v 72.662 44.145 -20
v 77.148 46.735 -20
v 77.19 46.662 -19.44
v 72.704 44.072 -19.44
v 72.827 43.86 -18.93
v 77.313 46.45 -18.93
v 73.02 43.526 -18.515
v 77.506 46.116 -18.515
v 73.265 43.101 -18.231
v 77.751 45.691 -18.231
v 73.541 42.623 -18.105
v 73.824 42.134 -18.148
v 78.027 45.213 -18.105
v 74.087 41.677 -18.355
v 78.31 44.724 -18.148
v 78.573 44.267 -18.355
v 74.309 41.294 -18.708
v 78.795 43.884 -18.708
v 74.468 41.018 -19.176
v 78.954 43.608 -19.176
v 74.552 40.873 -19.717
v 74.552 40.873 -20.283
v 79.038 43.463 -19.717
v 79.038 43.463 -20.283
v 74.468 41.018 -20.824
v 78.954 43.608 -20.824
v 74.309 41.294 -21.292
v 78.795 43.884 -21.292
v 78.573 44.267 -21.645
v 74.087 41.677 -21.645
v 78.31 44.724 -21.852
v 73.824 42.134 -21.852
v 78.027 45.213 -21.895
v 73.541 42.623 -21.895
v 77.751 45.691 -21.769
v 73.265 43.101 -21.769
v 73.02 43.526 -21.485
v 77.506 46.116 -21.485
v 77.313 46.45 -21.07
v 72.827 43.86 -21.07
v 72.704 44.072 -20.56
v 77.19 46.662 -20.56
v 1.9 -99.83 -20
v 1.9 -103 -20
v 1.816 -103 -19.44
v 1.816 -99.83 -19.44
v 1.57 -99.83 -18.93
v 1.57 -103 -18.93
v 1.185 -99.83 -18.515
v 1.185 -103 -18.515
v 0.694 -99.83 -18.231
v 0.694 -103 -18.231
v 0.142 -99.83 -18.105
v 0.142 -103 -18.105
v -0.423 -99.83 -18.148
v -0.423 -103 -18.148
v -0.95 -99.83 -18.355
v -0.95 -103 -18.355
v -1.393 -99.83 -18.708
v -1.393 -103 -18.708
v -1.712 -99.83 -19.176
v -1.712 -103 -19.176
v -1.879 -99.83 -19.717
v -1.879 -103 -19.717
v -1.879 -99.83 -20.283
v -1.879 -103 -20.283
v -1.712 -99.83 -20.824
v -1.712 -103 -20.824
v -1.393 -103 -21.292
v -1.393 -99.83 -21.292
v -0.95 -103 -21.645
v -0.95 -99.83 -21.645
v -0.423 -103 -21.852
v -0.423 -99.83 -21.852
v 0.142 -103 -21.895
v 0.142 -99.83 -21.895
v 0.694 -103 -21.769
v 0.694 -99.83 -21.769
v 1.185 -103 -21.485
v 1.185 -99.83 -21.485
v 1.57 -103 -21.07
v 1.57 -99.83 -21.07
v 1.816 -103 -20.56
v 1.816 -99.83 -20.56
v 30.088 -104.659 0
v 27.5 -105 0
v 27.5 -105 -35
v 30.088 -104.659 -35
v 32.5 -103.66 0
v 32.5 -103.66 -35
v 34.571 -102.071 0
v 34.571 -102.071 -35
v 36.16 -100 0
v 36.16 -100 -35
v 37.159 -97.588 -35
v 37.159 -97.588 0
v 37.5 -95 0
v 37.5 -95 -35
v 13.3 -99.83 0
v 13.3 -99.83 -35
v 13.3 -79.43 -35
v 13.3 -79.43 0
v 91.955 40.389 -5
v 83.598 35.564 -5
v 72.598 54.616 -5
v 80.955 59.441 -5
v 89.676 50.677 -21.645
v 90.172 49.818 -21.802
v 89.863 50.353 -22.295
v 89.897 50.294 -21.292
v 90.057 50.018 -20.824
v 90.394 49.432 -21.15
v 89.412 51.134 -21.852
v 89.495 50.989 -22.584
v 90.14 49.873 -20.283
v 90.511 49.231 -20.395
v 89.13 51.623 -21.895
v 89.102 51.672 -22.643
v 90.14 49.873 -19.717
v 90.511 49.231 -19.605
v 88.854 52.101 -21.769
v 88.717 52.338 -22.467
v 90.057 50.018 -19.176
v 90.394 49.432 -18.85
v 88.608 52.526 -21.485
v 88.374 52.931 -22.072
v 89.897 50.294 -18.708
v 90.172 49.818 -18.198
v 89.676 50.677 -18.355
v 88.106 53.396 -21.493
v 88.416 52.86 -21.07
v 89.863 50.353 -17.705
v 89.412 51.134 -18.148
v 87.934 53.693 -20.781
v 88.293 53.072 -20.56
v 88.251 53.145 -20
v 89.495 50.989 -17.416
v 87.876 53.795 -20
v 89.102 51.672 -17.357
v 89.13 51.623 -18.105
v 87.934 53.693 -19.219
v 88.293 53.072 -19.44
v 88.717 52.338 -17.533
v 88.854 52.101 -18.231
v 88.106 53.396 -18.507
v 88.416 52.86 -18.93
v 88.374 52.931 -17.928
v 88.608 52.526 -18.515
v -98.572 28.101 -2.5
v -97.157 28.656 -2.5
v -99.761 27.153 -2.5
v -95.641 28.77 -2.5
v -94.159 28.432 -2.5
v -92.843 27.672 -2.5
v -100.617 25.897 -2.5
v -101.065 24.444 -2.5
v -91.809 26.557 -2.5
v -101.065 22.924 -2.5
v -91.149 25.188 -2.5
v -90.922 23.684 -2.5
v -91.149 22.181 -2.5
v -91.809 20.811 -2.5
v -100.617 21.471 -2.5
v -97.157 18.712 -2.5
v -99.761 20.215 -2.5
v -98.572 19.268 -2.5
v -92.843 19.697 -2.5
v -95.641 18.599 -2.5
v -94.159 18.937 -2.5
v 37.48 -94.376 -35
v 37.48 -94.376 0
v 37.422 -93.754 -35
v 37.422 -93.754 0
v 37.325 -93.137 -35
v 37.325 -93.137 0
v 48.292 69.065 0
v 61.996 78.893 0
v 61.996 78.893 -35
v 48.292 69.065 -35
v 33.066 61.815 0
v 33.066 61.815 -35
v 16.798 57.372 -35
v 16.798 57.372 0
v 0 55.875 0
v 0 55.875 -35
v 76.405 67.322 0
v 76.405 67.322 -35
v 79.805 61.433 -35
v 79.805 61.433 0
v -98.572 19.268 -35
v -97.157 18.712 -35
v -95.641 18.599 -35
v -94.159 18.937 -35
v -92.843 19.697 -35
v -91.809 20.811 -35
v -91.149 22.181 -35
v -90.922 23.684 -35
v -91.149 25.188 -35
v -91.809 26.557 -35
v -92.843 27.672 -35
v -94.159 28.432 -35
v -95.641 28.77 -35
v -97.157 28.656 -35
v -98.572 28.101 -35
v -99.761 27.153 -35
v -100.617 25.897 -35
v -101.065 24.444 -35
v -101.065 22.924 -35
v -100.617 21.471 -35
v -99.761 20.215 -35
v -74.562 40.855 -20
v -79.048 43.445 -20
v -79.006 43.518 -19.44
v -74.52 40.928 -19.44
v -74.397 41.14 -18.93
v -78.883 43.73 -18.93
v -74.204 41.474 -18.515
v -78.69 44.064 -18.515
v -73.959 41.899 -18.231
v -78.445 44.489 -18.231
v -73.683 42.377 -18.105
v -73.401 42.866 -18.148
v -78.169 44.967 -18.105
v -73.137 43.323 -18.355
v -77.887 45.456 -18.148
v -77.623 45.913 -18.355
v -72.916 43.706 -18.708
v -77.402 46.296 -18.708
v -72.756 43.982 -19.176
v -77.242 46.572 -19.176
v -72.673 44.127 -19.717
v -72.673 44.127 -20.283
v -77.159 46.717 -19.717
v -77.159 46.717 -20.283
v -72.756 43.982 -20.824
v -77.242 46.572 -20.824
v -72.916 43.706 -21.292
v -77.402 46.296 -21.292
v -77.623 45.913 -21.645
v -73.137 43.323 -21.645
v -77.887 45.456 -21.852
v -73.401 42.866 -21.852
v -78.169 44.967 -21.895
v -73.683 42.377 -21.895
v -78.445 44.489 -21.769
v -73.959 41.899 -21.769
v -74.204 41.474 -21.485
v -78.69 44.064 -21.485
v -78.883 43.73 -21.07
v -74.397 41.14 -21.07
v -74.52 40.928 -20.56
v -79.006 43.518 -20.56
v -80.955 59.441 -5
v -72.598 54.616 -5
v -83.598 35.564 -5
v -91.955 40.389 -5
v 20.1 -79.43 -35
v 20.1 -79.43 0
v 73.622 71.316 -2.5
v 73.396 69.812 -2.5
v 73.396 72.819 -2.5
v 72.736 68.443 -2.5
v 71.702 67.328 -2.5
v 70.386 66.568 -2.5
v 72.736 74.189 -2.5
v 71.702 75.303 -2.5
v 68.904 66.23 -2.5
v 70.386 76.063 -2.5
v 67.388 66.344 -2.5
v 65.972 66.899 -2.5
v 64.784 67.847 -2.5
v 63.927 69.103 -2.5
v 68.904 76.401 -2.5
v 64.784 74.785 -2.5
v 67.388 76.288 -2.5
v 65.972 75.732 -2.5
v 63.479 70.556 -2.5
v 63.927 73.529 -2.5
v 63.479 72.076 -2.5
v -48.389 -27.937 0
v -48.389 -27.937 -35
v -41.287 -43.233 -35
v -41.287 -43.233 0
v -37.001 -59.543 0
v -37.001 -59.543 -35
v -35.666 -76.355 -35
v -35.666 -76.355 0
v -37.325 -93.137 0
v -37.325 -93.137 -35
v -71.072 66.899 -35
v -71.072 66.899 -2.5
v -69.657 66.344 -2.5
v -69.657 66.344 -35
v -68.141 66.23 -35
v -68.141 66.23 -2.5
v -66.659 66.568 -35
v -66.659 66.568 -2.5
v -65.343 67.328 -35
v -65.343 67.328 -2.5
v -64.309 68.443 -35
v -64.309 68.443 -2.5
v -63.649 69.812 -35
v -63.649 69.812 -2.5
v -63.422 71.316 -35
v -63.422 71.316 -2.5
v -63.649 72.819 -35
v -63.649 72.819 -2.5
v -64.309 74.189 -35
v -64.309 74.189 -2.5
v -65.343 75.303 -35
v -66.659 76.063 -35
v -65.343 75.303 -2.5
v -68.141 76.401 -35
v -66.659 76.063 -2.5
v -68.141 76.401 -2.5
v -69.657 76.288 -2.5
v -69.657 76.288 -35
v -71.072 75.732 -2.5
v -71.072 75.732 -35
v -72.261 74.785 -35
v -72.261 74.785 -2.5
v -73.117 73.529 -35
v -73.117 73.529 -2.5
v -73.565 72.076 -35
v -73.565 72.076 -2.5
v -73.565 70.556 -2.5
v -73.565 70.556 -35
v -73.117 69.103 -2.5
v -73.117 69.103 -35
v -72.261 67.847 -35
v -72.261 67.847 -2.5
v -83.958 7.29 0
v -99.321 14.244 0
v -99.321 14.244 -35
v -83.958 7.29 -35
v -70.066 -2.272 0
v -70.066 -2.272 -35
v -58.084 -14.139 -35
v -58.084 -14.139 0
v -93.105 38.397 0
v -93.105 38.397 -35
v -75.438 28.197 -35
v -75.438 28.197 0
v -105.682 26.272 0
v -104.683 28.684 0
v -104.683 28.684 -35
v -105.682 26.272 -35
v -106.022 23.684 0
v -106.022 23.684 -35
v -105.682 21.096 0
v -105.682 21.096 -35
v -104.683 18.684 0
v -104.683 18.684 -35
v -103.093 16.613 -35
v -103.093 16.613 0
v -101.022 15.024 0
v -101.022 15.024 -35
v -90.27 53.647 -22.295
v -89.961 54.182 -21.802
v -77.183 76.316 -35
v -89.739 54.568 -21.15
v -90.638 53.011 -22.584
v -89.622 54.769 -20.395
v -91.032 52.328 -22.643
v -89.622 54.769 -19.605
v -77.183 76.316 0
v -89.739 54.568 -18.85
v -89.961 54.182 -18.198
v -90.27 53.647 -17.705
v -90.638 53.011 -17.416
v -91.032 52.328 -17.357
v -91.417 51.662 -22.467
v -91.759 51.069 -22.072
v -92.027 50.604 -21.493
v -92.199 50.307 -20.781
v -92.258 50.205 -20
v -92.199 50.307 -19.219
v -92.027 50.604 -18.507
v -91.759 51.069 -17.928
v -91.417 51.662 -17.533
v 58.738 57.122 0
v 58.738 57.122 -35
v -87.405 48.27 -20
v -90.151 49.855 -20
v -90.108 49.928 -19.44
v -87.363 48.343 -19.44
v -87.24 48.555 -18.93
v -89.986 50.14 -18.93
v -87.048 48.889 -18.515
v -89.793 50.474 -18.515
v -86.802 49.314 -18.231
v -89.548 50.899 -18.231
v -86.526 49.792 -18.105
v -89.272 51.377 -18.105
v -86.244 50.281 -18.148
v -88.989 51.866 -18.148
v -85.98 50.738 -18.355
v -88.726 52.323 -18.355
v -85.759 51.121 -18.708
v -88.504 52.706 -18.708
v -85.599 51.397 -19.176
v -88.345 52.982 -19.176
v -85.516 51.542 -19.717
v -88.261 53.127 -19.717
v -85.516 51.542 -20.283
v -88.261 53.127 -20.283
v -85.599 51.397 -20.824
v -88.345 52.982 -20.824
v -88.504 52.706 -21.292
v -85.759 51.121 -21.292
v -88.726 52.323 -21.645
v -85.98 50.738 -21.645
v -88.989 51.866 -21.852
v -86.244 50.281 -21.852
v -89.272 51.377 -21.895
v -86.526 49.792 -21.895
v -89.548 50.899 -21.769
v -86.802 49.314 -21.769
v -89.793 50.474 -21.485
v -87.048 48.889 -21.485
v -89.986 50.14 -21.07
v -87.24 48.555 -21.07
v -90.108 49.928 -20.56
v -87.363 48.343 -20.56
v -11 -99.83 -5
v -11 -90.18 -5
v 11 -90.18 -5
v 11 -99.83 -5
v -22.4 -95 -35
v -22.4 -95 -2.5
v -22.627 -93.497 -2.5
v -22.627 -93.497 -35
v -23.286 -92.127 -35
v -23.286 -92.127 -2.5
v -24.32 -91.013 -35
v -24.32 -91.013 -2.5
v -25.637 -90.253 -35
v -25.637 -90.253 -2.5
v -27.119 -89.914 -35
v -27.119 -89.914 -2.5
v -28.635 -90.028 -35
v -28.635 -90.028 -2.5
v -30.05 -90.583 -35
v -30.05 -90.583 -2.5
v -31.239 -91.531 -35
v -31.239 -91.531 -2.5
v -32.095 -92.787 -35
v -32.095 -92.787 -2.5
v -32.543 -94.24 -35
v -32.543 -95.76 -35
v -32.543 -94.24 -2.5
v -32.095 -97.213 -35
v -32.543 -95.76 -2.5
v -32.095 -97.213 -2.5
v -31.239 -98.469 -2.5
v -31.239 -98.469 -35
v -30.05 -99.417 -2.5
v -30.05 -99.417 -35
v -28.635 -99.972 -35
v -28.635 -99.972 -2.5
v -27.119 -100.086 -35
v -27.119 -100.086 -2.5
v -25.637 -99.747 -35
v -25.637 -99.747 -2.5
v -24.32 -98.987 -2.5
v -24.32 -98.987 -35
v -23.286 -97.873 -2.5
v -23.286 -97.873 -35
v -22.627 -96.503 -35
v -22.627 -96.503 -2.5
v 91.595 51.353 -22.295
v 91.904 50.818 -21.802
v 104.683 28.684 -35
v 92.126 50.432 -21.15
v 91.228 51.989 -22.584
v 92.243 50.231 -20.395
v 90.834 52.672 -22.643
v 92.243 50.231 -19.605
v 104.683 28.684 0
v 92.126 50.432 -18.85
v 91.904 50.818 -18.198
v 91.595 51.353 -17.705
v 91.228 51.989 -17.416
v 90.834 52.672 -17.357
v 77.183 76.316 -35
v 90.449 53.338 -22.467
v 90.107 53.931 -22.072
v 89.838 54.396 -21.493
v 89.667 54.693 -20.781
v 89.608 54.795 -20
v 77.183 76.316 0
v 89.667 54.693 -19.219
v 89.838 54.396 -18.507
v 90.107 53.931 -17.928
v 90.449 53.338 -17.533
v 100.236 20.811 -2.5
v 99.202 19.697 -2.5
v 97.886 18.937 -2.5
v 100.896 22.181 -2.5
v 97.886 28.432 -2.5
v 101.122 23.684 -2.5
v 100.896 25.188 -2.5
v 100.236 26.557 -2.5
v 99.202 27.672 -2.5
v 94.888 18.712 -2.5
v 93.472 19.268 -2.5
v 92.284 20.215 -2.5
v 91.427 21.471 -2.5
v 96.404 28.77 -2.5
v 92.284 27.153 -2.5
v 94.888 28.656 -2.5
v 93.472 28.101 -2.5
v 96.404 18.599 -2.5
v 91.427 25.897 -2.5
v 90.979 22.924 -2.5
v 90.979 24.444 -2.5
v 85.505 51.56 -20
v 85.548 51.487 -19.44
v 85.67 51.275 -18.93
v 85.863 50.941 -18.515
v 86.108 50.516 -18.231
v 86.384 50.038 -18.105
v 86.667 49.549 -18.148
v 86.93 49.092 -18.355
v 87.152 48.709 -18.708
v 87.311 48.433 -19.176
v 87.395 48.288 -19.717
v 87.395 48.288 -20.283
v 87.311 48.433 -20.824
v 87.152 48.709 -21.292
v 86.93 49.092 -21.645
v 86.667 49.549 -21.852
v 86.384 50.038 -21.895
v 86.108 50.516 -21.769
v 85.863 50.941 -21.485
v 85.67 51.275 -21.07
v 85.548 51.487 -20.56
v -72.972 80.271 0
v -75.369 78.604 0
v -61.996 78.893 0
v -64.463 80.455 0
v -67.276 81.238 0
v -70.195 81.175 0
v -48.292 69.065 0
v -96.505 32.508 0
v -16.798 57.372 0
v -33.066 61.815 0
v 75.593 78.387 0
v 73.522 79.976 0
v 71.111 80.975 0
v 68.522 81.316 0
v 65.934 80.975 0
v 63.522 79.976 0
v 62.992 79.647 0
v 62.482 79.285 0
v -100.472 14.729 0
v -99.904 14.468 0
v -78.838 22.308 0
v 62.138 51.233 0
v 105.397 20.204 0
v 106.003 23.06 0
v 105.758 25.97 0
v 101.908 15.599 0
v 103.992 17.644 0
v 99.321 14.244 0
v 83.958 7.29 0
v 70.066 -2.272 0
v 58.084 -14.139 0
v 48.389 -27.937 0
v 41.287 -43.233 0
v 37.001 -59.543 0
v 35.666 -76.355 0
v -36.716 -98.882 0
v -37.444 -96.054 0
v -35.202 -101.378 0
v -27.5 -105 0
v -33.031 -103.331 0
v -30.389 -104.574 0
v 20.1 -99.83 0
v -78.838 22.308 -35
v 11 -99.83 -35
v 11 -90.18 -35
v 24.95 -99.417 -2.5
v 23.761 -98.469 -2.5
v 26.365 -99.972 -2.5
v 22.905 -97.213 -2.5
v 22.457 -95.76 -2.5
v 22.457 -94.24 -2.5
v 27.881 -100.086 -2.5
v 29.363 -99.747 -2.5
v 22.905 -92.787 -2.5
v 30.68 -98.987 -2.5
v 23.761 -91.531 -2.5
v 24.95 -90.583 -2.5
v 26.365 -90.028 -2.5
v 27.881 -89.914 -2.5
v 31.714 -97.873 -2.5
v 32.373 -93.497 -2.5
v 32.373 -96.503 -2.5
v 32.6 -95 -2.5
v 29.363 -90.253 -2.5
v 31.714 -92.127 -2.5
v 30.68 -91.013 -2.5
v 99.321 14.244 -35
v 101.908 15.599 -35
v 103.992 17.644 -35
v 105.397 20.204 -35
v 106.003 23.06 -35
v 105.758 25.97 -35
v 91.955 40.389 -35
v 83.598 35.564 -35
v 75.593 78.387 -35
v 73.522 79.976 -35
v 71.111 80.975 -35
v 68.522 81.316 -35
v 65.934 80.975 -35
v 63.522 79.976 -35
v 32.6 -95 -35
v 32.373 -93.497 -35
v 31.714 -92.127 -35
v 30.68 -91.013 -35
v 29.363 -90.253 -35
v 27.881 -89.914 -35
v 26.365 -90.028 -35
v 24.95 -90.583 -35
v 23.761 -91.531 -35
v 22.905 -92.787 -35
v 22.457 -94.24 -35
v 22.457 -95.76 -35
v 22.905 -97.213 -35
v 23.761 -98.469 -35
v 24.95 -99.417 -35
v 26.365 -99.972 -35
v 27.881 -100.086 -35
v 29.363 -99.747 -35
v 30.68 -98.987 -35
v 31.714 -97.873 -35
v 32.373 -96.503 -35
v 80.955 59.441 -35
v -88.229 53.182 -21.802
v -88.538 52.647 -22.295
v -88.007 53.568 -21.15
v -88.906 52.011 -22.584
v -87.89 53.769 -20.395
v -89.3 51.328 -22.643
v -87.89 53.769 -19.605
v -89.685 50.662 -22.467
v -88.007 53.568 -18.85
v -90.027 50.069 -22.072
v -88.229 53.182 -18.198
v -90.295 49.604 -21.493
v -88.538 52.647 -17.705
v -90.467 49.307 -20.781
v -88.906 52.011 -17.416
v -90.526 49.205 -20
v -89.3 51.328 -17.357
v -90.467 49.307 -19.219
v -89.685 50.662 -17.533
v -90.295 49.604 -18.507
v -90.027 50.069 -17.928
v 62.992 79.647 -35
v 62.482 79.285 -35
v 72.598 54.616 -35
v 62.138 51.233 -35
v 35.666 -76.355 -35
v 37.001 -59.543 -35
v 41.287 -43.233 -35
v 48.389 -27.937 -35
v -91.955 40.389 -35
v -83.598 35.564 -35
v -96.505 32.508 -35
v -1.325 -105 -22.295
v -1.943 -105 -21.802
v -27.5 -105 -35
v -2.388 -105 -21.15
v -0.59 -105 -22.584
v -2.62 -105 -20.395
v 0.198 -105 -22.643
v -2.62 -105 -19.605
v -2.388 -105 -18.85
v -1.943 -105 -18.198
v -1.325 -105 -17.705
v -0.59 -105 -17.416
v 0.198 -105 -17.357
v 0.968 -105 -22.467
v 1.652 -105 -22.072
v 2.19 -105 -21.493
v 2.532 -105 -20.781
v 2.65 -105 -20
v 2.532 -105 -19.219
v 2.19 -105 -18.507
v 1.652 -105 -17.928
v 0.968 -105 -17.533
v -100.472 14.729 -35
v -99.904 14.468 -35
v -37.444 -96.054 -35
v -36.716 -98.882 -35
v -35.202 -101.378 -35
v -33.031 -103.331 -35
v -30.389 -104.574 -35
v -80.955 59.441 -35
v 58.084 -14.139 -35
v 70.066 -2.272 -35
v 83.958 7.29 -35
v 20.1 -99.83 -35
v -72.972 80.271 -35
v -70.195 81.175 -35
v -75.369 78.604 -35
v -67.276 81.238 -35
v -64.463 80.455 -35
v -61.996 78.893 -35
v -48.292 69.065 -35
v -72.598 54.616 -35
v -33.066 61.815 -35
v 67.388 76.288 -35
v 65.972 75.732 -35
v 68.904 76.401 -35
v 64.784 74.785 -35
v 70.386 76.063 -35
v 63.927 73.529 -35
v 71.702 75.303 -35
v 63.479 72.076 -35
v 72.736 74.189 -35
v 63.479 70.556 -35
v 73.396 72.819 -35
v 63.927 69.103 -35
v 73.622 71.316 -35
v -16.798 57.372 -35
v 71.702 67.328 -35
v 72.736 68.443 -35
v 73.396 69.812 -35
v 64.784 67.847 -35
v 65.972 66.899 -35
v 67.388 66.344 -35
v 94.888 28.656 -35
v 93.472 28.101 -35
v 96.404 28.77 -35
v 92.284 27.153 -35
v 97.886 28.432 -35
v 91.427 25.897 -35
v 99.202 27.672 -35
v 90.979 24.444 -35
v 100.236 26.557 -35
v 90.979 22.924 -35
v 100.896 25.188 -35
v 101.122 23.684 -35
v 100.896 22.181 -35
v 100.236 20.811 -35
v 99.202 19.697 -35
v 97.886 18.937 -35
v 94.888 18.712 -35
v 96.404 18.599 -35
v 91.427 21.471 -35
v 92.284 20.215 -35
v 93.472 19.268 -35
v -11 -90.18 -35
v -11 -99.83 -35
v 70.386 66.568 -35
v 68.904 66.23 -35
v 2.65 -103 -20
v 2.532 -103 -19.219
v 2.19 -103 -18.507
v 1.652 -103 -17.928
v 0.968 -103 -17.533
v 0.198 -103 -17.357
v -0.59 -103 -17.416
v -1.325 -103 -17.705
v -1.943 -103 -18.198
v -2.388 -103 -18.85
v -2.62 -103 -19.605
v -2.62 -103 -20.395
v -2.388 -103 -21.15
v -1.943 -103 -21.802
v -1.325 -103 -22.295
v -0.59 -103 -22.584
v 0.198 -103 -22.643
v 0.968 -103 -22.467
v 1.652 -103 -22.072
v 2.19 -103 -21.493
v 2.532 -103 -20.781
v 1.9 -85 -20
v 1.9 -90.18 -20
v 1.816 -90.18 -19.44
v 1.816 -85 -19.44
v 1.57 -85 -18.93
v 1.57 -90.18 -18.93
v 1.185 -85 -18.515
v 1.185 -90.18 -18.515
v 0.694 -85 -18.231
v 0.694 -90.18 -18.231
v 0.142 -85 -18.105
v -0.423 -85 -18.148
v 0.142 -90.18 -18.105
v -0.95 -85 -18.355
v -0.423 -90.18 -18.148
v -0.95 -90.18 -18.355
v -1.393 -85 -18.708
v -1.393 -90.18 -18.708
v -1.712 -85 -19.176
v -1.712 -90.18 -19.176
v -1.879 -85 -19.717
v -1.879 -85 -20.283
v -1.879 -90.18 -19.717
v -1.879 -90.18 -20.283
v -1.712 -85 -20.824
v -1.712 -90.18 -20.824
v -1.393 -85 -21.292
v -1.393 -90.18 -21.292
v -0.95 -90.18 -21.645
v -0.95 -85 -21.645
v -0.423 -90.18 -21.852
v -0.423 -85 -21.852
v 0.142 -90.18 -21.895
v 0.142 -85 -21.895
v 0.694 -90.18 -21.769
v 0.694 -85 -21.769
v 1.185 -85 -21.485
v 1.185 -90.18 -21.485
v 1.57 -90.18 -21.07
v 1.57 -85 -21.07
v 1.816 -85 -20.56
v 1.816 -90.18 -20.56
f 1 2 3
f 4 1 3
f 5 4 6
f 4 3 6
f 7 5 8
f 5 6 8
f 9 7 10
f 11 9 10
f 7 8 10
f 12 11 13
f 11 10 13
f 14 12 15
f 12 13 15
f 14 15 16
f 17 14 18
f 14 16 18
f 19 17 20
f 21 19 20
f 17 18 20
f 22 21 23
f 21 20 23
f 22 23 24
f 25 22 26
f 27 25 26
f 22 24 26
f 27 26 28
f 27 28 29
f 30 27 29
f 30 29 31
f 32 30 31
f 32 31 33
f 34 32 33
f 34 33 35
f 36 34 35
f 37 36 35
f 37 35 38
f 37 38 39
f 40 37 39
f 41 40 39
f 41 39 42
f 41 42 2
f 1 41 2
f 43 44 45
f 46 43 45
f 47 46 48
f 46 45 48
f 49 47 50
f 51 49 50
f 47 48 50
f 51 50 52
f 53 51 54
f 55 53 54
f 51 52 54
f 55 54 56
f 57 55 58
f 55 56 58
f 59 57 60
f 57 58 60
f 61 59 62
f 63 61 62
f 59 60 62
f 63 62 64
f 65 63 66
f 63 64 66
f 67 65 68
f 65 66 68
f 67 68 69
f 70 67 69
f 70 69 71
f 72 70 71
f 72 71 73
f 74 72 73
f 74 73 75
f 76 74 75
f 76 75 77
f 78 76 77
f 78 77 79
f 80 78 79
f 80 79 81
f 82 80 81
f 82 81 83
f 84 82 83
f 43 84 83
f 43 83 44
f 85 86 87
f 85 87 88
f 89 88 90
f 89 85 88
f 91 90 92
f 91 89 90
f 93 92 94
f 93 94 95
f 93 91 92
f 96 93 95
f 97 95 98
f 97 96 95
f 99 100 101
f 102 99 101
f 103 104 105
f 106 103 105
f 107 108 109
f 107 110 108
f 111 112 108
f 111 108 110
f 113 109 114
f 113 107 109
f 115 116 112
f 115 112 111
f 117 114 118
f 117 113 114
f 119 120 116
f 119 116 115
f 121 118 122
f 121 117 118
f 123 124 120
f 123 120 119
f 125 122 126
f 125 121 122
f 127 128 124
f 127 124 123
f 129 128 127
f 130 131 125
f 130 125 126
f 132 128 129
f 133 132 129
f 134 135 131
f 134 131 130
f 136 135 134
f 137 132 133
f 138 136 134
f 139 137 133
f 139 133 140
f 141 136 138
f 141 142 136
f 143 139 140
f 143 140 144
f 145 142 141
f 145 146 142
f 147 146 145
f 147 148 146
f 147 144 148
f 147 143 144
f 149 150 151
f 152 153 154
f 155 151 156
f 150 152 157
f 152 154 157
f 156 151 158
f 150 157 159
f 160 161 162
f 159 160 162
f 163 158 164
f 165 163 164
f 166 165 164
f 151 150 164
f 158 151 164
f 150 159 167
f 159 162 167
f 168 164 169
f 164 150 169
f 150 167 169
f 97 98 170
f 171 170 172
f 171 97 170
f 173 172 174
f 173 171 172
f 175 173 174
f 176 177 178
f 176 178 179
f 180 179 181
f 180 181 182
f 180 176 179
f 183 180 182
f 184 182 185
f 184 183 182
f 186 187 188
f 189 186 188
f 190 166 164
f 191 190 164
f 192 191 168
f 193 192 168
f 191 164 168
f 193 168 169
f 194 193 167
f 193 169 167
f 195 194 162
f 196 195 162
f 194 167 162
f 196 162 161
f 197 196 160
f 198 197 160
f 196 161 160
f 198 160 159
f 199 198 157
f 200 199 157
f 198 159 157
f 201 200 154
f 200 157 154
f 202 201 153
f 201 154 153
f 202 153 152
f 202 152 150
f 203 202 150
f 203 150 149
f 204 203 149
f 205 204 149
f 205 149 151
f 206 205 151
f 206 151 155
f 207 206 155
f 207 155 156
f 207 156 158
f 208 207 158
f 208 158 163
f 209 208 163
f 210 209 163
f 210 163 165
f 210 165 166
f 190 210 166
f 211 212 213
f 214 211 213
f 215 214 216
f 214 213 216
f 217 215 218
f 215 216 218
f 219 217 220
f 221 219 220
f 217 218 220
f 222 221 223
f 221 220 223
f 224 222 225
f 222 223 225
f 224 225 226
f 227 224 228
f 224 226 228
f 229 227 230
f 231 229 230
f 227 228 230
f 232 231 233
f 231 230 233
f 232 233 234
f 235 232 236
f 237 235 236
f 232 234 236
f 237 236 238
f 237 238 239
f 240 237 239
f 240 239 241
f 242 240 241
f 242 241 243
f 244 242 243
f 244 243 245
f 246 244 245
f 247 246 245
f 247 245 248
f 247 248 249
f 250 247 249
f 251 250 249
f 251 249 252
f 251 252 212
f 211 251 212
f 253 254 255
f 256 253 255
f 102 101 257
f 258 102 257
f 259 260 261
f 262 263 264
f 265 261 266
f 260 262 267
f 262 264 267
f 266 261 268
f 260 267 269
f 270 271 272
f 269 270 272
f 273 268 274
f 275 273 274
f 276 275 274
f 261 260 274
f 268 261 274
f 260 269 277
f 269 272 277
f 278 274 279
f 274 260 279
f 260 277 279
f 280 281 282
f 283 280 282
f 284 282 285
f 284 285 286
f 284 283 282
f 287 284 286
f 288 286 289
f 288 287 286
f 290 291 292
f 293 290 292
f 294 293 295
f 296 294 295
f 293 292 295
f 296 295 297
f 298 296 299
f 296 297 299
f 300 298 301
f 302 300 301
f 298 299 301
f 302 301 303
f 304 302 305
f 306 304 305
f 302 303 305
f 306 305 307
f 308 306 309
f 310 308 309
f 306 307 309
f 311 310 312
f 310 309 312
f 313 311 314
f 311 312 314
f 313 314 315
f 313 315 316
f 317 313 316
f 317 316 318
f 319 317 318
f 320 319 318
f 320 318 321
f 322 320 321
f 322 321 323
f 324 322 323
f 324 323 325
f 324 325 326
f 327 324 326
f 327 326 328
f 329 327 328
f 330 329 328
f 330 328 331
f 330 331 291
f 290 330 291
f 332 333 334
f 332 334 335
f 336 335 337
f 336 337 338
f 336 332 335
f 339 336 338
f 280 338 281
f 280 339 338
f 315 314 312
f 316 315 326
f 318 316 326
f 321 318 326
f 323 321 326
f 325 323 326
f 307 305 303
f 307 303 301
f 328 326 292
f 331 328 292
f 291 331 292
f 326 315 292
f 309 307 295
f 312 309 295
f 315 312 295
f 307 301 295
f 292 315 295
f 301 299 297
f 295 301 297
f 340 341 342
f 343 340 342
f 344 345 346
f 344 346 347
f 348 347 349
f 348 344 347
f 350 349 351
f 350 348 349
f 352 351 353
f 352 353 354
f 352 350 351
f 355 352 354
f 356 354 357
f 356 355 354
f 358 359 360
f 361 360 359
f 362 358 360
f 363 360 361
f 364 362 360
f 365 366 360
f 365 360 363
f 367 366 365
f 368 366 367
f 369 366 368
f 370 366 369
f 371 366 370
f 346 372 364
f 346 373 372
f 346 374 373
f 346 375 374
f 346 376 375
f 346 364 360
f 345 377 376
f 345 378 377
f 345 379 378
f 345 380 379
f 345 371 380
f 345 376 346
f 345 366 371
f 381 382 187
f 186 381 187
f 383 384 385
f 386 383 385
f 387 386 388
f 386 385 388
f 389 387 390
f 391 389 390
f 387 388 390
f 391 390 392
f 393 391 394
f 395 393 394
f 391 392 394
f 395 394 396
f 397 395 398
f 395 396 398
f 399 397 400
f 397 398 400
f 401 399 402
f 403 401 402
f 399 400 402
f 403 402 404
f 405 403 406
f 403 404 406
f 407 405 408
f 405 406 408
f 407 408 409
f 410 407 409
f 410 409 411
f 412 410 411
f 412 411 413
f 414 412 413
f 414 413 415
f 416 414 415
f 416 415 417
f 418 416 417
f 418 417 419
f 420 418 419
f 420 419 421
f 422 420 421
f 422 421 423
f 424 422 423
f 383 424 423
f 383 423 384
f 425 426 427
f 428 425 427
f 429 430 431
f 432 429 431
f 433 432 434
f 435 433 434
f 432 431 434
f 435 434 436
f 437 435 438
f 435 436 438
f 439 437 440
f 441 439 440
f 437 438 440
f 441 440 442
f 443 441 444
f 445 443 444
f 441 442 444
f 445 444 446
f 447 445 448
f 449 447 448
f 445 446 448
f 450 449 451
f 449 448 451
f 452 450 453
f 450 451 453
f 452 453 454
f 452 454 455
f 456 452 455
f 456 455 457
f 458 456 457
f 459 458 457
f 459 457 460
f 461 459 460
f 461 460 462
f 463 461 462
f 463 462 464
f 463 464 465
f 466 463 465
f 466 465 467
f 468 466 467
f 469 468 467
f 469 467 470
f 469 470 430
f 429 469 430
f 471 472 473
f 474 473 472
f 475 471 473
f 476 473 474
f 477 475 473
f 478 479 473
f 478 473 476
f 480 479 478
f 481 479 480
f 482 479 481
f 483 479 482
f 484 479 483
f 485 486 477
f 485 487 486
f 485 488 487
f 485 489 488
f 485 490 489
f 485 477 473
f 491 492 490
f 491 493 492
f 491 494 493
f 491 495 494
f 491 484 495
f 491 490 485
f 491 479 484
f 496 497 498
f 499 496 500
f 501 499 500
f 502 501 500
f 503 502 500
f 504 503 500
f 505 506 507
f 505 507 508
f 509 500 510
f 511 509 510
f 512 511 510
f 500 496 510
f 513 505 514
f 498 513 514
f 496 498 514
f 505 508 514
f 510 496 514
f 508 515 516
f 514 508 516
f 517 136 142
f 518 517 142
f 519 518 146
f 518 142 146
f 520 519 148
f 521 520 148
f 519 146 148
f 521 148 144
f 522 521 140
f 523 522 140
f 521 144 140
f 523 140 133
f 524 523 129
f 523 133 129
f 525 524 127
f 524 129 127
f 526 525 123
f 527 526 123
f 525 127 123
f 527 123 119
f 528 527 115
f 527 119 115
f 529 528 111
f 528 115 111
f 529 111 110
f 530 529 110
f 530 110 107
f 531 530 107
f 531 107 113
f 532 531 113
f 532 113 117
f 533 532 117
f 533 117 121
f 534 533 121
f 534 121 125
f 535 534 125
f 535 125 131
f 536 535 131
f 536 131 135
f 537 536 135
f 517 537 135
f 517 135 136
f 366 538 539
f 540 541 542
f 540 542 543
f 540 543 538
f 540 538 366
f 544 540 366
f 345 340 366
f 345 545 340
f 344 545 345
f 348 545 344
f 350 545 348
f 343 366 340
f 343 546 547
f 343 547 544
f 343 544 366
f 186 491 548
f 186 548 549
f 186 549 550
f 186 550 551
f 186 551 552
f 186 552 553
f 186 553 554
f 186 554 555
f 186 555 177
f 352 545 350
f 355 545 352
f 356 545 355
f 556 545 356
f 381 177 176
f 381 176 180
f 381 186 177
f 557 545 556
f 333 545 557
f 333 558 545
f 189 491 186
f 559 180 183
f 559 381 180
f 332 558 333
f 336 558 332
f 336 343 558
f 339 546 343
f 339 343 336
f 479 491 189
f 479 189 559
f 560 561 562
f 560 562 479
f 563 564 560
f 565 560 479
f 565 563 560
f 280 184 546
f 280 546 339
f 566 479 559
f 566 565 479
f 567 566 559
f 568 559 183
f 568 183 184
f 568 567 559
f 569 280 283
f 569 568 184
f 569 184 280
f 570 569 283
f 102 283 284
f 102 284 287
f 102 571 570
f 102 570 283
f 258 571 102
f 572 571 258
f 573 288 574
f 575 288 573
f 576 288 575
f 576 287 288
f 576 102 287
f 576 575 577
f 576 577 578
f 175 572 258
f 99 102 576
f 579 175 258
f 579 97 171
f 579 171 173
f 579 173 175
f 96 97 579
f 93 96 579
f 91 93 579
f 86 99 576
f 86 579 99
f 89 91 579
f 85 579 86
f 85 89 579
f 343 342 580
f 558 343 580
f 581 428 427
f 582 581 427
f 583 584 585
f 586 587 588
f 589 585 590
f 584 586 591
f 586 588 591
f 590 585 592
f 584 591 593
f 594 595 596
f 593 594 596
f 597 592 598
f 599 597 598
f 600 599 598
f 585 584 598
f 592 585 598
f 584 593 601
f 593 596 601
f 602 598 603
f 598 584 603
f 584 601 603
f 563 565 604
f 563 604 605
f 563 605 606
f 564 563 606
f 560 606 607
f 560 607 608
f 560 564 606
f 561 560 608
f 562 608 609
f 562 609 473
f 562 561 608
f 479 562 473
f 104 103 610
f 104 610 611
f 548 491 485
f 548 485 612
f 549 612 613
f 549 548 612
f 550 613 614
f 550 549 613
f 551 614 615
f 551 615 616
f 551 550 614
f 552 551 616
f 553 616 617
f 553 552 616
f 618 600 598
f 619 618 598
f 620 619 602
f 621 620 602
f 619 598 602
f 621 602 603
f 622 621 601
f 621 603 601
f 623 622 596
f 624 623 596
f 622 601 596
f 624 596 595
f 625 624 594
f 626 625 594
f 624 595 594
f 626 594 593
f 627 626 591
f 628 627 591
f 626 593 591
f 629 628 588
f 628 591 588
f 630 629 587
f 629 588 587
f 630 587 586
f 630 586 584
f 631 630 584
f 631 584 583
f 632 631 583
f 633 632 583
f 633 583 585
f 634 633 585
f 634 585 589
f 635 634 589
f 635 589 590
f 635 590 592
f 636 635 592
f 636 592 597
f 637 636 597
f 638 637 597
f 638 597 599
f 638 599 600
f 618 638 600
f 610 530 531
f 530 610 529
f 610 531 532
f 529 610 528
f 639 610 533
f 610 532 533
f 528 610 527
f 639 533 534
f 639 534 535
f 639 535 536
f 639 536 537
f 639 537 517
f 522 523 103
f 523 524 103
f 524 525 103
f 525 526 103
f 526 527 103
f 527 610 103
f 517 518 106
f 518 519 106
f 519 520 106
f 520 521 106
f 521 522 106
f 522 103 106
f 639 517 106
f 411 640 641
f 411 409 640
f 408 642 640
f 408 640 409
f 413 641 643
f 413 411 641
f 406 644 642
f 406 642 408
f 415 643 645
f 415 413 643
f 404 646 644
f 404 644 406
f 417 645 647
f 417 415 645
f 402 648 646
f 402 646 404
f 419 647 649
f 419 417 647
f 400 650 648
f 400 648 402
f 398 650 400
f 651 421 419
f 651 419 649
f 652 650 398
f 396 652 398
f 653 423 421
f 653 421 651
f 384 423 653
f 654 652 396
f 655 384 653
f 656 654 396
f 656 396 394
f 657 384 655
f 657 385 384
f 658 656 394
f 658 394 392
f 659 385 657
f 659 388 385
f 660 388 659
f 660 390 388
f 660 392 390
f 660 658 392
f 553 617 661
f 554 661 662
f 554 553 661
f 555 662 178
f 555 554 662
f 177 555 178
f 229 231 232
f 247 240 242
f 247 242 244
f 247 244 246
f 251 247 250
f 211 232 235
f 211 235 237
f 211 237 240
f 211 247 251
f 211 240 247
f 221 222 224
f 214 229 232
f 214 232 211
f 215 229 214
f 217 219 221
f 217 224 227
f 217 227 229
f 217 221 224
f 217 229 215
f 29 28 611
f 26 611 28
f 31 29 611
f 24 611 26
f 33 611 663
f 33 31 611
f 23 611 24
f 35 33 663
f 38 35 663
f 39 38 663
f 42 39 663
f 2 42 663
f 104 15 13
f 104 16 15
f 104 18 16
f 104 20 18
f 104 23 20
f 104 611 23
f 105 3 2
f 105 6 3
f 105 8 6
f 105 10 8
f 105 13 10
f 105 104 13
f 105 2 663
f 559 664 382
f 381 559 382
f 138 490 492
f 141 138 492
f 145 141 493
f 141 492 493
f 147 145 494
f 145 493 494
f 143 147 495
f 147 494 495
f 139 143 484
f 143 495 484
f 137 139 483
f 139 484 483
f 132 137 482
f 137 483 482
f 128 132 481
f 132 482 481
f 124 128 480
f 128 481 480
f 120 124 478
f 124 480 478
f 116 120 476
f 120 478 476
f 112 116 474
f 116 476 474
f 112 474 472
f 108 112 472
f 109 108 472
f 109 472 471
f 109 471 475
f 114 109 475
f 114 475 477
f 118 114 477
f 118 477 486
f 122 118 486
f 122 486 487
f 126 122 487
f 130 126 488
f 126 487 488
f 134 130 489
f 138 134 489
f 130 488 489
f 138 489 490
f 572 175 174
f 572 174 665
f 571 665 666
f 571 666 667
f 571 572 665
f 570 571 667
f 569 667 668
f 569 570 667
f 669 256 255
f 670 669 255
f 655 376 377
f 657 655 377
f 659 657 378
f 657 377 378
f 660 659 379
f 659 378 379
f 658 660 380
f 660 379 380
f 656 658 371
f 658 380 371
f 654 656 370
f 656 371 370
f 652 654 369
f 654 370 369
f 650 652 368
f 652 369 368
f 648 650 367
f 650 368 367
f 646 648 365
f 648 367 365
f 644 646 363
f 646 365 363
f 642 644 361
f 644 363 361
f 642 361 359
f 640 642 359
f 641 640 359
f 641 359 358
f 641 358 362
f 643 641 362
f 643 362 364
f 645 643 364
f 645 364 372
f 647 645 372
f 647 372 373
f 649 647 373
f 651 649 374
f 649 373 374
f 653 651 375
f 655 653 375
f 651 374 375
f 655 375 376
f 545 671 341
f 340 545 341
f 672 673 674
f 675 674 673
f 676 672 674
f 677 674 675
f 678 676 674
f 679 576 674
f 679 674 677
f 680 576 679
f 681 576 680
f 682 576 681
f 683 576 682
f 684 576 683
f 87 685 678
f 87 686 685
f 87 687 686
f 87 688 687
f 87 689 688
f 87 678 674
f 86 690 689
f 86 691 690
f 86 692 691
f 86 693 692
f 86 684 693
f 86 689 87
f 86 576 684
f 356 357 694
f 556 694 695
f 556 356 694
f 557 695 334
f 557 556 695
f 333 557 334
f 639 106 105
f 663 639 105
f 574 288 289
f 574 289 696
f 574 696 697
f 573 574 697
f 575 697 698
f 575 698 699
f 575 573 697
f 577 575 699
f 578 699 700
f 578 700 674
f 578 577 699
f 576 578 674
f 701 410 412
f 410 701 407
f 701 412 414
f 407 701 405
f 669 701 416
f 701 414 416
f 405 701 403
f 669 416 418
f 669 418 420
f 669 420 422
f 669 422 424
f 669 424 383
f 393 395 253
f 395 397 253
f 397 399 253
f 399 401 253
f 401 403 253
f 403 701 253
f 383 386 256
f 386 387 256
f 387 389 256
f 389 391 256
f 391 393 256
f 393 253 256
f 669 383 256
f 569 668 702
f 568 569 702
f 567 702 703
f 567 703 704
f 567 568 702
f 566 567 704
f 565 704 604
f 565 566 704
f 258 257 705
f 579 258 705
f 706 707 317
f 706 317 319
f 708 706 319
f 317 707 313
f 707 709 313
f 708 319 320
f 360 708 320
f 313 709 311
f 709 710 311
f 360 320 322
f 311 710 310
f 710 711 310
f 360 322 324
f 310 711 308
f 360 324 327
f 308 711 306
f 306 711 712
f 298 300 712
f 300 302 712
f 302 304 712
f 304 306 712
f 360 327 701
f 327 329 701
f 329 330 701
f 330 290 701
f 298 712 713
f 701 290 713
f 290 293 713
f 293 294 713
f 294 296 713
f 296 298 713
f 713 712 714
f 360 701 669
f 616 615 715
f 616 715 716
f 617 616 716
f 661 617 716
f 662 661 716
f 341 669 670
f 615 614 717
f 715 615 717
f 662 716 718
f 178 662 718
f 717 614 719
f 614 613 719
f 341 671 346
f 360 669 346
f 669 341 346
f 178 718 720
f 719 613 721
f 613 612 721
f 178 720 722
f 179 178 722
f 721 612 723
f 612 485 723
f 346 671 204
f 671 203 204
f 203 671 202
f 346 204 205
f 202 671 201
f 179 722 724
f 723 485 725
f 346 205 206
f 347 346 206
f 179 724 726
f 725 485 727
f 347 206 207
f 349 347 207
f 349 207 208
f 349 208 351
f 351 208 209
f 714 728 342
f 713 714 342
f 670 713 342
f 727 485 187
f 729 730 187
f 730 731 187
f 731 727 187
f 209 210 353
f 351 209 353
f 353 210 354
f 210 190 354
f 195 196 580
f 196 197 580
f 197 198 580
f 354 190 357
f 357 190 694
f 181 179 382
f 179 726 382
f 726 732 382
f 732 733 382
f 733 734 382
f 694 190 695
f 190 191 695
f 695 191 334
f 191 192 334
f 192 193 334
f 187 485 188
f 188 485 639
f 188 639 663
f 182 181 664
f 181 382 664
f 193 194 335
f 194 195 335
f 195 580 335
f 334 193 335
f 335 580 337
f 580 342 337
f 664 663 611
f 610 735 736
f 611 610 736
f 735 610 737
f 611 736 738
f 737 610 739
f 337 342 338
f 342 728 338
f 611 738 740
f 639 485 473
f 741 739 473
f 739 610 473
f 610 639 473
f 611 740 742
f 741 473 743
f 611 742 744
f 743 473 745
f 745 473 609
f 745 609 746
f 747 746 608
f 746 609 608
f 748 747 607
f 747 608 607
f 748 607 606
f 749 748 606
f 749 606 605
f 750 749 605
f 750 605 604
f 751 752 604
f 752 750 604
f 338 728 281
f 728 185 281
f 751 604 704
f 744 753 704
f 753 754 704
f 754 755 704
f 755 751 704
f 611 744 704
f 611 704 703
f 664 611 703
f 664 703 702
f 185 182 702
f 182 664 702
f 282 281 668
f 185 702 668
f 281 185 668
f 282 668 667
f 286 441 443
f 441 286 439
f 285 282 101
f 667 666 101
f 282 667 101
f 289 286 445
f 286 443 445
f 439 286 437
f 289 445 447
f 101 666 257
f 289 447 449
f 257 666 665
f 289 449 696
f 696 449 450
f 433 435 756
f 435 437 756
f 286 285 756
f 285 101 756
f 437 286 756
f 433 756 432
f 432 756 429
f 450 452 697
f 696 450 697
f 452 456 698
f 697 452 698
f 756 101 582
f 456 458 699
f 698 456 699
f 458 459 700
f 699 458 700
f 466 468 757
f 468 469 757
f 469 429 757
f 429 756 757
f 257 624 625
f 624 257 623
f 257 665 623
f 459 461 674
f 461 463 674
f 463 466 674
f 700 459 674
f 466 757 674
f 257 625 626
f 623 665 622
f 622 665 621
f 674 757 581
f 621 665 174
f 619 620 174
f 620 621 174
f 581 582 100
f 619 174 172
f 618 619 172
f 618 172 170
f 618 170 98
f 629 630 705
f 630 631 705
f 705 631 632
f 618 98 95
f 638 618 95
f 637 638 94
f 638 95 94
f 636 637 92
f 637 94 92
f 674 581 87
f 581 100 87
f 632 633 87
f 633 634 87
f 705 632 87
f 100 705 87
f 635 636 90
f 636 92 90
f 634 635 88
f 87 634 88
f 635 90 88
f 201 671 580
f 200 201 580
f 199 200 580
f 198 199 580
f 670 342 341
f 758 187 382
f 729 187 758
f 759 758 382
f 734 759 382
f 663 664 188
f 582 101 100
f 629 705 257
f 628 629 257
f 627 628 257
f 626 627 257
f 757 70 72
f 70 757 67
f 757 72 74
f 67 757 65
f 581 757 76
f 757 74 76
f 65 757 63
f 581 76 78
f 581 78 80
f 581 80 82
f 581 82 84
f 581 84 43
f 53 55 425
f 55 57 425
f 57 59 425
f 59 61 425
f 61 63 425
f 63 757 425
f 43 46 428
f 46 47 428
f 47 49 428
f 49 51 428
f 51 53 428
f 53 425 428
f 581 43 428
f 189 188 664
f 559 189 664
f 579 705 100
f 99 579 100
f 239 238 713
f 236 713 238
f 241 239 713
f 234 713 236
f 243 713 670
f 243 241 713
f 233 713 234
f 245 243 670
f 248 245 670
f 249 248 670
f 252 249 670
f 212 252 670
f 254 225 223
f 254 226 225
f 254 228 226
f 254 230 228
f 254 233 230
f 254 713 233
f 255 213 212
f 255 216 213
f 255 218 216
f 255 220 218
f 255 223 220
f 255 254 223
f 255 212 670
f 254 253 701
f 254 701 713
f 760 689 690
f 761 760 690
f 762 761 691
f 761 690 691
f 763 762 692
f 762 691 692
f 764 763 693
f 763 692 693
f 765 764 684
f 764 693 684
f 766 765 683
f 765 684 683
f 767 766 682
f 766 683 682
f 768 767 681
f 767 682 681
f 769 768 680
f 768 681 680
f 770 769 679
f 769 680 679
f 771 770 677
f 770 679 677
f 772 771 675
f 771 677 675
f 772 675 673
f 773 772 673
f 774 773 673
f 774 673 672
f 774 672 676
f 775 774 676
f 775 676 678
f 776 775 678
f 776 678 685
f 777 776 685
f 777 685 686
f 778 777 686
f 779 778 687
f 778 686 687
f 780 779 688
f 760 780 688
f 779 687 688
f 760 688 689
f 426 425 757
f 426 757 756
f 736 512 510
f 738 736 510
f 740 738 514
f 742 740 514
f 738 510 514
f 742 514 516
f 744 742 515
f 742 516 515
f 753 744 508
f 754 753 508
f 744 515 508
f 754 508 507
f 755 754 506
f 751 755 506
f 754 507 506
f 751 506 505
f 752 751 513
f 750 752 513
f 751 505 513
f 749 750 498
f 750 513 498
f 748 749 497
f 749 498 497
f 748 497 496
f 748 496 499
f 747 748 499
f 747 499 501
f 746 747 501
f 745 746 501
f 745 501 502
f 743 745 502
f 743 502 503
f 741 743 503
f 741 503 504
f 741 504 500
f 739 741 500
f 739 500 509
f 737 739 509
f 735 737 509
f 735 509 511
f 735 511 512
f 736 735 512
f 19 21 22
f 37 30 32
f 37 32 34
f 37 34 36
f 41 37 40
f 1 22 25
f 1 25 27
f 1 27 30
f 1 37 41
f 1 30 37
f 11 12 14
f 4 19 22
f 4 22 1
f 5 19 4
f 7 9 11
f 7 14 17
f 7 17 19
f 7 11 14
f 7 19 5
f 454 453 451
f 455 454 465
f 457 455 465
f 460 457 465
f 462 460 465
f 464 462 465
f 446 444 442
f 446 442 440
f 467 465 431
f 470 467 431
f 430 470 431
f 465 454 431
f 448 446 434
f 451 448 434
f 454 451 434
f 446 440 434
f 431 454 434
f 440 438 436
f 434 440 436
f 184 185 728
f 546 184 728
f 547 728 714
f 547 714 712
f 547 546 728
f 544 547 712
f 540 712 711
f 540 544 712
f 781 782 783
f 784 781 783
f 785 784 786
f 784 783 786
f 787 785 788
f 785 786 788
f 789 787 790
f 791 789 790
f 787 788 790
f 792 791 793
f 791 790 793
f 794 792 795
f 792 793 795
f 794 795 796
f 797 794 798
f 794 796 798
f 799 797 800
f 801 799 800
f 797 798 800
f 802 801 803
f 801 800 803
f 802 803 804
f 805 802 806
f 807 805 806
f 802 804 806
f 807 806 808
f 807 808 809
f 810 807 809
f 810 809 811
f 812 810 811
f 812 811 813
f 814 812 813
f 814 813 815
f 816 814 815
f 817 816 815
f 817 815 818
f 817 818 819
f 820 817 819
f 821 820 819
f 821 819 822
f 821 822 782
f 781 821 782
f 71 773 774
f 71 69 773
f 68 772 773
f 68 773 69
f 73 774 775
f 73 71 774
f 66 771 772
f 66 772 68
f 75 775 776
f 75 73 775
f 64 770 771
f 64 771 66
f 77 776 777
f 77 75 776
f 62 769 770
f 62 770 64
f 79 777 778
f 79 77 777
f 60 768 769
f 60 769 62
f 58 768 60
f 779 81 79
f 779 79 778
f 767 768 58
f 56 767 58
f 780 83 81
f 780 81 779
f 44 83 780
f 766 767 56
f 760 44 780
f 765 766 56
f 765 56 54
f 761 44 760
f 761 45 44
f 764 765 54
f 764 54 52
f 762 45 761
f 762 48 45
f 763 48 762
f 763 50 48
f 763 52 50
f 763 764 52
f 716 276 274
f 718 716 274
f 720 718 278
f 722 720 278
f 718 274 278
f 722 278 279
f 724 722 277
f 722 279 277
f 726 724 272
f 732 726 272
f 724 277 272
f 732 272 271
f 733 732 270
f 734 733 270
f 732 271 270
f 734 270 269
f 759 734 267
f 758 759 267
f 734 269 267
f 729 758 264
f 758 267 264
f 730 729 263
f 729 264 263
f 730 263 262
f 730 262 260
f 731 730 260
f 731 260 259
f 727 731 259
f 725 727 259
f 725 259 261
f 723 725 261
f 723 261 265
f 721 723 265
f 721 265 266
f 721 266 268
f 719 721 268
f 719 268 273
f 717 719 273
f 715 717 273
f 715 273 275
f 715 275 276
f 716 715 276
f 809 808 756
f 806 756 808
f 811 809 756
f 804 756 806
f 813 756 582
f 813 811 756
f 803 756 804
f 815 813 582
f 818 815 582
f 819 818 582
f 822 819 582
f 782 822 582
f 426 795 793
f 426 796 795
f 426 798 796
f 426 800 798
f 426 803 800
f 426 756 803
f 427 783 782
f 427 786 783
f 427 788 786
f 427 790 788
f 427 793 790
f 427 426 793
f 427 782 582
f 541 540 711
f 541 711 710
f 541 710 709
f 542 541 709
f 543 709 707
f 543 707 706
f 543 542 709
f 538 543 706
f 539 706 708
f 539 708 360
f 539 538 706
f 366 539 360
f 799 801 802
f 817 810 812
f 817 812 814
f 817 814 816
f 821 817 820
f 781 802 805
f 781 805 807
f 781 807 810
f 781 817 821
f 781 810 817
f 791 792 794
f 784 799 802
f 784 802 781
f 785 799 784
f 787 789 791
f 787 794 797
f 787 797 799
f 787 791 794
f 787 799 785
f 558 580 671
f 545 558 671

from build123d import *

# Parameters (mm, degrees)
F0_R      = 5.1
F1_DEPTH  = 35
F3_START  = -5
F2_W      = 22
F2_H      = 9.65
F3_DEPTH  = 30
F4_DEPTH  = 2.5
F5_R      = 1.9
F6_DEPTH  = 20
F5_R_2    = 2.65
F7_DEPTH  = 2
F9_DEPTH  = 35
F10_COUNT = 3
F10_ANGLE = 240


with BuildPart() as f1:
    # F0 (on Top) → F1 (new body)
    with BuildSketch(Plane.XY):
        with BuildLine():
            Line((48.3891499996, -27.9374887781), (0, 0))
            Line((0, 0), (-48.3891499996, -27.9374887781))
            ThreePointArc((-48.3891499996, -27.9374887781), (-37.0005953155, -59.5433683199), (-37.3249107961, -93.1369036932))
            ThreePointArc((-37.3249107961, -93.1369036932), (-26.5643472762, -85.0438685233), (-17.5, -95))
            ThreePointArc((-17.5, -95), (-20.4289321881, -102.0710678119), (-27.5, -105))
            Line((-27.5, -105), (27.5, -105))
            ThreePointArc((27.5, -105), (19.7983455327, -88.6215583043), (37.3249107961, -93.1369036932))
            ThreePointArc((37.3249107961, -93.1369036932), (37.0005953155, -59.5433683199), (48.3891499996, -27.9374887781))
        make_face()
        with BuildLine():
            ThreePointArc((-17.5, -95), (-26.5643472762, -85.0438685233), (-37.3249107961, -93.1369036932))
            ThreePointArc((-37.3249107961, -93.1369036932), (-35.2016544673, -101.3784416957), (-27.5, -105))
            ThreePointArc((-27.5, -105), (-20.4289321881, -102.0710678119), (-17.5, -95))
        make_face()
        with Locations((-27.5, -95)):
            Circle(F0_R, mode=Mode.SUBTRACT)
        with BuildLine():
            ThreePointArc((37.5, -95), (37.4561314767, -94.0643472762), (37.3249107961, -93.1369036932))
            ThreePointArc((37.3249107961, -93.1369036932), (19.7983455327, -88.6215583043), (27.5, -105))
            ThreePointArc((27.5, -105), (34.5710678119, -102.0710678119), (37.5, -95))
        make_face()
        with Locations((27.5, -95)):
            Circle(F0_R, mode=Mode.SUBTRACT)
    extrude(amount=-F1_DEPTH)

    # F2 (on face) → F3 (cut)
    with BuildSketch(Plane.XY.offset(F3_START)):
        with Locations((0, -95.005)):
            Rectangle(F2_W, F2_H)
    extrude(amount=-F3_DEPTH, mode=Mode.SUBTRACT)

    # F0 (on Top) → F4 (join)
    with BuildSketch(Plane.XY):
        with Locations((-27.5, -95)):
            Circle(F0_R)
        with Locations((27.5, -95)):
            Circle(F0_R)
    extrude(amount=-F4_DEPTH)

    # F5 (on face) → F6 (cut)
    with BuildSketch(Plane.XZ.offset(105)):
        with Locations((0, -20)):
            Circle(F5_R)
    extrude(amount=-F6_DEPTH, mode=Mode.SUBTRACT)

    # F5 (on face) → F7 (cut)
    with BuildSketch(Plane.XZ.offset(105)):
        with Locations((0, -20)):
            Circle(F5_R_2)
        with Locations((0, -20)):
            Circle(F5_R, mode=Mode.SUBTRACT)
    extrude(amount=-F7_DEPTH, mode=Mode.SUBTRACT)

    # F8 (on face) → F9 (cut, through all)
    with BuildSketch(Plane(origin=(0, 0, -35), x_dir=(1, 0, 0), z_dir=(0, 0, -1))):
        Polygon((20.1000036855, 95.005), (20.1000036855, 99.83), (13.2999987654, 99.83), (13.2999987654, 95.005), (13.2999987654, 79.43), (20.1000036855, 79.43), align=None)
    extrude(amount=-F9_DEPTH, mode=Mode.SUBTRACT)

    # F10: F1 ×3 about axis
    f10_axis = Axis((0, 0, 0), (0, 0, 1))


with BuildPart() as f1_1:
    add(f1.part)
    for i in range(1, F10_COUNT):
        add(f1.part.rotate(f10_axis, i * F10_ANGLE / (F10_COUNT - 1)))


solid = f1_1.part
